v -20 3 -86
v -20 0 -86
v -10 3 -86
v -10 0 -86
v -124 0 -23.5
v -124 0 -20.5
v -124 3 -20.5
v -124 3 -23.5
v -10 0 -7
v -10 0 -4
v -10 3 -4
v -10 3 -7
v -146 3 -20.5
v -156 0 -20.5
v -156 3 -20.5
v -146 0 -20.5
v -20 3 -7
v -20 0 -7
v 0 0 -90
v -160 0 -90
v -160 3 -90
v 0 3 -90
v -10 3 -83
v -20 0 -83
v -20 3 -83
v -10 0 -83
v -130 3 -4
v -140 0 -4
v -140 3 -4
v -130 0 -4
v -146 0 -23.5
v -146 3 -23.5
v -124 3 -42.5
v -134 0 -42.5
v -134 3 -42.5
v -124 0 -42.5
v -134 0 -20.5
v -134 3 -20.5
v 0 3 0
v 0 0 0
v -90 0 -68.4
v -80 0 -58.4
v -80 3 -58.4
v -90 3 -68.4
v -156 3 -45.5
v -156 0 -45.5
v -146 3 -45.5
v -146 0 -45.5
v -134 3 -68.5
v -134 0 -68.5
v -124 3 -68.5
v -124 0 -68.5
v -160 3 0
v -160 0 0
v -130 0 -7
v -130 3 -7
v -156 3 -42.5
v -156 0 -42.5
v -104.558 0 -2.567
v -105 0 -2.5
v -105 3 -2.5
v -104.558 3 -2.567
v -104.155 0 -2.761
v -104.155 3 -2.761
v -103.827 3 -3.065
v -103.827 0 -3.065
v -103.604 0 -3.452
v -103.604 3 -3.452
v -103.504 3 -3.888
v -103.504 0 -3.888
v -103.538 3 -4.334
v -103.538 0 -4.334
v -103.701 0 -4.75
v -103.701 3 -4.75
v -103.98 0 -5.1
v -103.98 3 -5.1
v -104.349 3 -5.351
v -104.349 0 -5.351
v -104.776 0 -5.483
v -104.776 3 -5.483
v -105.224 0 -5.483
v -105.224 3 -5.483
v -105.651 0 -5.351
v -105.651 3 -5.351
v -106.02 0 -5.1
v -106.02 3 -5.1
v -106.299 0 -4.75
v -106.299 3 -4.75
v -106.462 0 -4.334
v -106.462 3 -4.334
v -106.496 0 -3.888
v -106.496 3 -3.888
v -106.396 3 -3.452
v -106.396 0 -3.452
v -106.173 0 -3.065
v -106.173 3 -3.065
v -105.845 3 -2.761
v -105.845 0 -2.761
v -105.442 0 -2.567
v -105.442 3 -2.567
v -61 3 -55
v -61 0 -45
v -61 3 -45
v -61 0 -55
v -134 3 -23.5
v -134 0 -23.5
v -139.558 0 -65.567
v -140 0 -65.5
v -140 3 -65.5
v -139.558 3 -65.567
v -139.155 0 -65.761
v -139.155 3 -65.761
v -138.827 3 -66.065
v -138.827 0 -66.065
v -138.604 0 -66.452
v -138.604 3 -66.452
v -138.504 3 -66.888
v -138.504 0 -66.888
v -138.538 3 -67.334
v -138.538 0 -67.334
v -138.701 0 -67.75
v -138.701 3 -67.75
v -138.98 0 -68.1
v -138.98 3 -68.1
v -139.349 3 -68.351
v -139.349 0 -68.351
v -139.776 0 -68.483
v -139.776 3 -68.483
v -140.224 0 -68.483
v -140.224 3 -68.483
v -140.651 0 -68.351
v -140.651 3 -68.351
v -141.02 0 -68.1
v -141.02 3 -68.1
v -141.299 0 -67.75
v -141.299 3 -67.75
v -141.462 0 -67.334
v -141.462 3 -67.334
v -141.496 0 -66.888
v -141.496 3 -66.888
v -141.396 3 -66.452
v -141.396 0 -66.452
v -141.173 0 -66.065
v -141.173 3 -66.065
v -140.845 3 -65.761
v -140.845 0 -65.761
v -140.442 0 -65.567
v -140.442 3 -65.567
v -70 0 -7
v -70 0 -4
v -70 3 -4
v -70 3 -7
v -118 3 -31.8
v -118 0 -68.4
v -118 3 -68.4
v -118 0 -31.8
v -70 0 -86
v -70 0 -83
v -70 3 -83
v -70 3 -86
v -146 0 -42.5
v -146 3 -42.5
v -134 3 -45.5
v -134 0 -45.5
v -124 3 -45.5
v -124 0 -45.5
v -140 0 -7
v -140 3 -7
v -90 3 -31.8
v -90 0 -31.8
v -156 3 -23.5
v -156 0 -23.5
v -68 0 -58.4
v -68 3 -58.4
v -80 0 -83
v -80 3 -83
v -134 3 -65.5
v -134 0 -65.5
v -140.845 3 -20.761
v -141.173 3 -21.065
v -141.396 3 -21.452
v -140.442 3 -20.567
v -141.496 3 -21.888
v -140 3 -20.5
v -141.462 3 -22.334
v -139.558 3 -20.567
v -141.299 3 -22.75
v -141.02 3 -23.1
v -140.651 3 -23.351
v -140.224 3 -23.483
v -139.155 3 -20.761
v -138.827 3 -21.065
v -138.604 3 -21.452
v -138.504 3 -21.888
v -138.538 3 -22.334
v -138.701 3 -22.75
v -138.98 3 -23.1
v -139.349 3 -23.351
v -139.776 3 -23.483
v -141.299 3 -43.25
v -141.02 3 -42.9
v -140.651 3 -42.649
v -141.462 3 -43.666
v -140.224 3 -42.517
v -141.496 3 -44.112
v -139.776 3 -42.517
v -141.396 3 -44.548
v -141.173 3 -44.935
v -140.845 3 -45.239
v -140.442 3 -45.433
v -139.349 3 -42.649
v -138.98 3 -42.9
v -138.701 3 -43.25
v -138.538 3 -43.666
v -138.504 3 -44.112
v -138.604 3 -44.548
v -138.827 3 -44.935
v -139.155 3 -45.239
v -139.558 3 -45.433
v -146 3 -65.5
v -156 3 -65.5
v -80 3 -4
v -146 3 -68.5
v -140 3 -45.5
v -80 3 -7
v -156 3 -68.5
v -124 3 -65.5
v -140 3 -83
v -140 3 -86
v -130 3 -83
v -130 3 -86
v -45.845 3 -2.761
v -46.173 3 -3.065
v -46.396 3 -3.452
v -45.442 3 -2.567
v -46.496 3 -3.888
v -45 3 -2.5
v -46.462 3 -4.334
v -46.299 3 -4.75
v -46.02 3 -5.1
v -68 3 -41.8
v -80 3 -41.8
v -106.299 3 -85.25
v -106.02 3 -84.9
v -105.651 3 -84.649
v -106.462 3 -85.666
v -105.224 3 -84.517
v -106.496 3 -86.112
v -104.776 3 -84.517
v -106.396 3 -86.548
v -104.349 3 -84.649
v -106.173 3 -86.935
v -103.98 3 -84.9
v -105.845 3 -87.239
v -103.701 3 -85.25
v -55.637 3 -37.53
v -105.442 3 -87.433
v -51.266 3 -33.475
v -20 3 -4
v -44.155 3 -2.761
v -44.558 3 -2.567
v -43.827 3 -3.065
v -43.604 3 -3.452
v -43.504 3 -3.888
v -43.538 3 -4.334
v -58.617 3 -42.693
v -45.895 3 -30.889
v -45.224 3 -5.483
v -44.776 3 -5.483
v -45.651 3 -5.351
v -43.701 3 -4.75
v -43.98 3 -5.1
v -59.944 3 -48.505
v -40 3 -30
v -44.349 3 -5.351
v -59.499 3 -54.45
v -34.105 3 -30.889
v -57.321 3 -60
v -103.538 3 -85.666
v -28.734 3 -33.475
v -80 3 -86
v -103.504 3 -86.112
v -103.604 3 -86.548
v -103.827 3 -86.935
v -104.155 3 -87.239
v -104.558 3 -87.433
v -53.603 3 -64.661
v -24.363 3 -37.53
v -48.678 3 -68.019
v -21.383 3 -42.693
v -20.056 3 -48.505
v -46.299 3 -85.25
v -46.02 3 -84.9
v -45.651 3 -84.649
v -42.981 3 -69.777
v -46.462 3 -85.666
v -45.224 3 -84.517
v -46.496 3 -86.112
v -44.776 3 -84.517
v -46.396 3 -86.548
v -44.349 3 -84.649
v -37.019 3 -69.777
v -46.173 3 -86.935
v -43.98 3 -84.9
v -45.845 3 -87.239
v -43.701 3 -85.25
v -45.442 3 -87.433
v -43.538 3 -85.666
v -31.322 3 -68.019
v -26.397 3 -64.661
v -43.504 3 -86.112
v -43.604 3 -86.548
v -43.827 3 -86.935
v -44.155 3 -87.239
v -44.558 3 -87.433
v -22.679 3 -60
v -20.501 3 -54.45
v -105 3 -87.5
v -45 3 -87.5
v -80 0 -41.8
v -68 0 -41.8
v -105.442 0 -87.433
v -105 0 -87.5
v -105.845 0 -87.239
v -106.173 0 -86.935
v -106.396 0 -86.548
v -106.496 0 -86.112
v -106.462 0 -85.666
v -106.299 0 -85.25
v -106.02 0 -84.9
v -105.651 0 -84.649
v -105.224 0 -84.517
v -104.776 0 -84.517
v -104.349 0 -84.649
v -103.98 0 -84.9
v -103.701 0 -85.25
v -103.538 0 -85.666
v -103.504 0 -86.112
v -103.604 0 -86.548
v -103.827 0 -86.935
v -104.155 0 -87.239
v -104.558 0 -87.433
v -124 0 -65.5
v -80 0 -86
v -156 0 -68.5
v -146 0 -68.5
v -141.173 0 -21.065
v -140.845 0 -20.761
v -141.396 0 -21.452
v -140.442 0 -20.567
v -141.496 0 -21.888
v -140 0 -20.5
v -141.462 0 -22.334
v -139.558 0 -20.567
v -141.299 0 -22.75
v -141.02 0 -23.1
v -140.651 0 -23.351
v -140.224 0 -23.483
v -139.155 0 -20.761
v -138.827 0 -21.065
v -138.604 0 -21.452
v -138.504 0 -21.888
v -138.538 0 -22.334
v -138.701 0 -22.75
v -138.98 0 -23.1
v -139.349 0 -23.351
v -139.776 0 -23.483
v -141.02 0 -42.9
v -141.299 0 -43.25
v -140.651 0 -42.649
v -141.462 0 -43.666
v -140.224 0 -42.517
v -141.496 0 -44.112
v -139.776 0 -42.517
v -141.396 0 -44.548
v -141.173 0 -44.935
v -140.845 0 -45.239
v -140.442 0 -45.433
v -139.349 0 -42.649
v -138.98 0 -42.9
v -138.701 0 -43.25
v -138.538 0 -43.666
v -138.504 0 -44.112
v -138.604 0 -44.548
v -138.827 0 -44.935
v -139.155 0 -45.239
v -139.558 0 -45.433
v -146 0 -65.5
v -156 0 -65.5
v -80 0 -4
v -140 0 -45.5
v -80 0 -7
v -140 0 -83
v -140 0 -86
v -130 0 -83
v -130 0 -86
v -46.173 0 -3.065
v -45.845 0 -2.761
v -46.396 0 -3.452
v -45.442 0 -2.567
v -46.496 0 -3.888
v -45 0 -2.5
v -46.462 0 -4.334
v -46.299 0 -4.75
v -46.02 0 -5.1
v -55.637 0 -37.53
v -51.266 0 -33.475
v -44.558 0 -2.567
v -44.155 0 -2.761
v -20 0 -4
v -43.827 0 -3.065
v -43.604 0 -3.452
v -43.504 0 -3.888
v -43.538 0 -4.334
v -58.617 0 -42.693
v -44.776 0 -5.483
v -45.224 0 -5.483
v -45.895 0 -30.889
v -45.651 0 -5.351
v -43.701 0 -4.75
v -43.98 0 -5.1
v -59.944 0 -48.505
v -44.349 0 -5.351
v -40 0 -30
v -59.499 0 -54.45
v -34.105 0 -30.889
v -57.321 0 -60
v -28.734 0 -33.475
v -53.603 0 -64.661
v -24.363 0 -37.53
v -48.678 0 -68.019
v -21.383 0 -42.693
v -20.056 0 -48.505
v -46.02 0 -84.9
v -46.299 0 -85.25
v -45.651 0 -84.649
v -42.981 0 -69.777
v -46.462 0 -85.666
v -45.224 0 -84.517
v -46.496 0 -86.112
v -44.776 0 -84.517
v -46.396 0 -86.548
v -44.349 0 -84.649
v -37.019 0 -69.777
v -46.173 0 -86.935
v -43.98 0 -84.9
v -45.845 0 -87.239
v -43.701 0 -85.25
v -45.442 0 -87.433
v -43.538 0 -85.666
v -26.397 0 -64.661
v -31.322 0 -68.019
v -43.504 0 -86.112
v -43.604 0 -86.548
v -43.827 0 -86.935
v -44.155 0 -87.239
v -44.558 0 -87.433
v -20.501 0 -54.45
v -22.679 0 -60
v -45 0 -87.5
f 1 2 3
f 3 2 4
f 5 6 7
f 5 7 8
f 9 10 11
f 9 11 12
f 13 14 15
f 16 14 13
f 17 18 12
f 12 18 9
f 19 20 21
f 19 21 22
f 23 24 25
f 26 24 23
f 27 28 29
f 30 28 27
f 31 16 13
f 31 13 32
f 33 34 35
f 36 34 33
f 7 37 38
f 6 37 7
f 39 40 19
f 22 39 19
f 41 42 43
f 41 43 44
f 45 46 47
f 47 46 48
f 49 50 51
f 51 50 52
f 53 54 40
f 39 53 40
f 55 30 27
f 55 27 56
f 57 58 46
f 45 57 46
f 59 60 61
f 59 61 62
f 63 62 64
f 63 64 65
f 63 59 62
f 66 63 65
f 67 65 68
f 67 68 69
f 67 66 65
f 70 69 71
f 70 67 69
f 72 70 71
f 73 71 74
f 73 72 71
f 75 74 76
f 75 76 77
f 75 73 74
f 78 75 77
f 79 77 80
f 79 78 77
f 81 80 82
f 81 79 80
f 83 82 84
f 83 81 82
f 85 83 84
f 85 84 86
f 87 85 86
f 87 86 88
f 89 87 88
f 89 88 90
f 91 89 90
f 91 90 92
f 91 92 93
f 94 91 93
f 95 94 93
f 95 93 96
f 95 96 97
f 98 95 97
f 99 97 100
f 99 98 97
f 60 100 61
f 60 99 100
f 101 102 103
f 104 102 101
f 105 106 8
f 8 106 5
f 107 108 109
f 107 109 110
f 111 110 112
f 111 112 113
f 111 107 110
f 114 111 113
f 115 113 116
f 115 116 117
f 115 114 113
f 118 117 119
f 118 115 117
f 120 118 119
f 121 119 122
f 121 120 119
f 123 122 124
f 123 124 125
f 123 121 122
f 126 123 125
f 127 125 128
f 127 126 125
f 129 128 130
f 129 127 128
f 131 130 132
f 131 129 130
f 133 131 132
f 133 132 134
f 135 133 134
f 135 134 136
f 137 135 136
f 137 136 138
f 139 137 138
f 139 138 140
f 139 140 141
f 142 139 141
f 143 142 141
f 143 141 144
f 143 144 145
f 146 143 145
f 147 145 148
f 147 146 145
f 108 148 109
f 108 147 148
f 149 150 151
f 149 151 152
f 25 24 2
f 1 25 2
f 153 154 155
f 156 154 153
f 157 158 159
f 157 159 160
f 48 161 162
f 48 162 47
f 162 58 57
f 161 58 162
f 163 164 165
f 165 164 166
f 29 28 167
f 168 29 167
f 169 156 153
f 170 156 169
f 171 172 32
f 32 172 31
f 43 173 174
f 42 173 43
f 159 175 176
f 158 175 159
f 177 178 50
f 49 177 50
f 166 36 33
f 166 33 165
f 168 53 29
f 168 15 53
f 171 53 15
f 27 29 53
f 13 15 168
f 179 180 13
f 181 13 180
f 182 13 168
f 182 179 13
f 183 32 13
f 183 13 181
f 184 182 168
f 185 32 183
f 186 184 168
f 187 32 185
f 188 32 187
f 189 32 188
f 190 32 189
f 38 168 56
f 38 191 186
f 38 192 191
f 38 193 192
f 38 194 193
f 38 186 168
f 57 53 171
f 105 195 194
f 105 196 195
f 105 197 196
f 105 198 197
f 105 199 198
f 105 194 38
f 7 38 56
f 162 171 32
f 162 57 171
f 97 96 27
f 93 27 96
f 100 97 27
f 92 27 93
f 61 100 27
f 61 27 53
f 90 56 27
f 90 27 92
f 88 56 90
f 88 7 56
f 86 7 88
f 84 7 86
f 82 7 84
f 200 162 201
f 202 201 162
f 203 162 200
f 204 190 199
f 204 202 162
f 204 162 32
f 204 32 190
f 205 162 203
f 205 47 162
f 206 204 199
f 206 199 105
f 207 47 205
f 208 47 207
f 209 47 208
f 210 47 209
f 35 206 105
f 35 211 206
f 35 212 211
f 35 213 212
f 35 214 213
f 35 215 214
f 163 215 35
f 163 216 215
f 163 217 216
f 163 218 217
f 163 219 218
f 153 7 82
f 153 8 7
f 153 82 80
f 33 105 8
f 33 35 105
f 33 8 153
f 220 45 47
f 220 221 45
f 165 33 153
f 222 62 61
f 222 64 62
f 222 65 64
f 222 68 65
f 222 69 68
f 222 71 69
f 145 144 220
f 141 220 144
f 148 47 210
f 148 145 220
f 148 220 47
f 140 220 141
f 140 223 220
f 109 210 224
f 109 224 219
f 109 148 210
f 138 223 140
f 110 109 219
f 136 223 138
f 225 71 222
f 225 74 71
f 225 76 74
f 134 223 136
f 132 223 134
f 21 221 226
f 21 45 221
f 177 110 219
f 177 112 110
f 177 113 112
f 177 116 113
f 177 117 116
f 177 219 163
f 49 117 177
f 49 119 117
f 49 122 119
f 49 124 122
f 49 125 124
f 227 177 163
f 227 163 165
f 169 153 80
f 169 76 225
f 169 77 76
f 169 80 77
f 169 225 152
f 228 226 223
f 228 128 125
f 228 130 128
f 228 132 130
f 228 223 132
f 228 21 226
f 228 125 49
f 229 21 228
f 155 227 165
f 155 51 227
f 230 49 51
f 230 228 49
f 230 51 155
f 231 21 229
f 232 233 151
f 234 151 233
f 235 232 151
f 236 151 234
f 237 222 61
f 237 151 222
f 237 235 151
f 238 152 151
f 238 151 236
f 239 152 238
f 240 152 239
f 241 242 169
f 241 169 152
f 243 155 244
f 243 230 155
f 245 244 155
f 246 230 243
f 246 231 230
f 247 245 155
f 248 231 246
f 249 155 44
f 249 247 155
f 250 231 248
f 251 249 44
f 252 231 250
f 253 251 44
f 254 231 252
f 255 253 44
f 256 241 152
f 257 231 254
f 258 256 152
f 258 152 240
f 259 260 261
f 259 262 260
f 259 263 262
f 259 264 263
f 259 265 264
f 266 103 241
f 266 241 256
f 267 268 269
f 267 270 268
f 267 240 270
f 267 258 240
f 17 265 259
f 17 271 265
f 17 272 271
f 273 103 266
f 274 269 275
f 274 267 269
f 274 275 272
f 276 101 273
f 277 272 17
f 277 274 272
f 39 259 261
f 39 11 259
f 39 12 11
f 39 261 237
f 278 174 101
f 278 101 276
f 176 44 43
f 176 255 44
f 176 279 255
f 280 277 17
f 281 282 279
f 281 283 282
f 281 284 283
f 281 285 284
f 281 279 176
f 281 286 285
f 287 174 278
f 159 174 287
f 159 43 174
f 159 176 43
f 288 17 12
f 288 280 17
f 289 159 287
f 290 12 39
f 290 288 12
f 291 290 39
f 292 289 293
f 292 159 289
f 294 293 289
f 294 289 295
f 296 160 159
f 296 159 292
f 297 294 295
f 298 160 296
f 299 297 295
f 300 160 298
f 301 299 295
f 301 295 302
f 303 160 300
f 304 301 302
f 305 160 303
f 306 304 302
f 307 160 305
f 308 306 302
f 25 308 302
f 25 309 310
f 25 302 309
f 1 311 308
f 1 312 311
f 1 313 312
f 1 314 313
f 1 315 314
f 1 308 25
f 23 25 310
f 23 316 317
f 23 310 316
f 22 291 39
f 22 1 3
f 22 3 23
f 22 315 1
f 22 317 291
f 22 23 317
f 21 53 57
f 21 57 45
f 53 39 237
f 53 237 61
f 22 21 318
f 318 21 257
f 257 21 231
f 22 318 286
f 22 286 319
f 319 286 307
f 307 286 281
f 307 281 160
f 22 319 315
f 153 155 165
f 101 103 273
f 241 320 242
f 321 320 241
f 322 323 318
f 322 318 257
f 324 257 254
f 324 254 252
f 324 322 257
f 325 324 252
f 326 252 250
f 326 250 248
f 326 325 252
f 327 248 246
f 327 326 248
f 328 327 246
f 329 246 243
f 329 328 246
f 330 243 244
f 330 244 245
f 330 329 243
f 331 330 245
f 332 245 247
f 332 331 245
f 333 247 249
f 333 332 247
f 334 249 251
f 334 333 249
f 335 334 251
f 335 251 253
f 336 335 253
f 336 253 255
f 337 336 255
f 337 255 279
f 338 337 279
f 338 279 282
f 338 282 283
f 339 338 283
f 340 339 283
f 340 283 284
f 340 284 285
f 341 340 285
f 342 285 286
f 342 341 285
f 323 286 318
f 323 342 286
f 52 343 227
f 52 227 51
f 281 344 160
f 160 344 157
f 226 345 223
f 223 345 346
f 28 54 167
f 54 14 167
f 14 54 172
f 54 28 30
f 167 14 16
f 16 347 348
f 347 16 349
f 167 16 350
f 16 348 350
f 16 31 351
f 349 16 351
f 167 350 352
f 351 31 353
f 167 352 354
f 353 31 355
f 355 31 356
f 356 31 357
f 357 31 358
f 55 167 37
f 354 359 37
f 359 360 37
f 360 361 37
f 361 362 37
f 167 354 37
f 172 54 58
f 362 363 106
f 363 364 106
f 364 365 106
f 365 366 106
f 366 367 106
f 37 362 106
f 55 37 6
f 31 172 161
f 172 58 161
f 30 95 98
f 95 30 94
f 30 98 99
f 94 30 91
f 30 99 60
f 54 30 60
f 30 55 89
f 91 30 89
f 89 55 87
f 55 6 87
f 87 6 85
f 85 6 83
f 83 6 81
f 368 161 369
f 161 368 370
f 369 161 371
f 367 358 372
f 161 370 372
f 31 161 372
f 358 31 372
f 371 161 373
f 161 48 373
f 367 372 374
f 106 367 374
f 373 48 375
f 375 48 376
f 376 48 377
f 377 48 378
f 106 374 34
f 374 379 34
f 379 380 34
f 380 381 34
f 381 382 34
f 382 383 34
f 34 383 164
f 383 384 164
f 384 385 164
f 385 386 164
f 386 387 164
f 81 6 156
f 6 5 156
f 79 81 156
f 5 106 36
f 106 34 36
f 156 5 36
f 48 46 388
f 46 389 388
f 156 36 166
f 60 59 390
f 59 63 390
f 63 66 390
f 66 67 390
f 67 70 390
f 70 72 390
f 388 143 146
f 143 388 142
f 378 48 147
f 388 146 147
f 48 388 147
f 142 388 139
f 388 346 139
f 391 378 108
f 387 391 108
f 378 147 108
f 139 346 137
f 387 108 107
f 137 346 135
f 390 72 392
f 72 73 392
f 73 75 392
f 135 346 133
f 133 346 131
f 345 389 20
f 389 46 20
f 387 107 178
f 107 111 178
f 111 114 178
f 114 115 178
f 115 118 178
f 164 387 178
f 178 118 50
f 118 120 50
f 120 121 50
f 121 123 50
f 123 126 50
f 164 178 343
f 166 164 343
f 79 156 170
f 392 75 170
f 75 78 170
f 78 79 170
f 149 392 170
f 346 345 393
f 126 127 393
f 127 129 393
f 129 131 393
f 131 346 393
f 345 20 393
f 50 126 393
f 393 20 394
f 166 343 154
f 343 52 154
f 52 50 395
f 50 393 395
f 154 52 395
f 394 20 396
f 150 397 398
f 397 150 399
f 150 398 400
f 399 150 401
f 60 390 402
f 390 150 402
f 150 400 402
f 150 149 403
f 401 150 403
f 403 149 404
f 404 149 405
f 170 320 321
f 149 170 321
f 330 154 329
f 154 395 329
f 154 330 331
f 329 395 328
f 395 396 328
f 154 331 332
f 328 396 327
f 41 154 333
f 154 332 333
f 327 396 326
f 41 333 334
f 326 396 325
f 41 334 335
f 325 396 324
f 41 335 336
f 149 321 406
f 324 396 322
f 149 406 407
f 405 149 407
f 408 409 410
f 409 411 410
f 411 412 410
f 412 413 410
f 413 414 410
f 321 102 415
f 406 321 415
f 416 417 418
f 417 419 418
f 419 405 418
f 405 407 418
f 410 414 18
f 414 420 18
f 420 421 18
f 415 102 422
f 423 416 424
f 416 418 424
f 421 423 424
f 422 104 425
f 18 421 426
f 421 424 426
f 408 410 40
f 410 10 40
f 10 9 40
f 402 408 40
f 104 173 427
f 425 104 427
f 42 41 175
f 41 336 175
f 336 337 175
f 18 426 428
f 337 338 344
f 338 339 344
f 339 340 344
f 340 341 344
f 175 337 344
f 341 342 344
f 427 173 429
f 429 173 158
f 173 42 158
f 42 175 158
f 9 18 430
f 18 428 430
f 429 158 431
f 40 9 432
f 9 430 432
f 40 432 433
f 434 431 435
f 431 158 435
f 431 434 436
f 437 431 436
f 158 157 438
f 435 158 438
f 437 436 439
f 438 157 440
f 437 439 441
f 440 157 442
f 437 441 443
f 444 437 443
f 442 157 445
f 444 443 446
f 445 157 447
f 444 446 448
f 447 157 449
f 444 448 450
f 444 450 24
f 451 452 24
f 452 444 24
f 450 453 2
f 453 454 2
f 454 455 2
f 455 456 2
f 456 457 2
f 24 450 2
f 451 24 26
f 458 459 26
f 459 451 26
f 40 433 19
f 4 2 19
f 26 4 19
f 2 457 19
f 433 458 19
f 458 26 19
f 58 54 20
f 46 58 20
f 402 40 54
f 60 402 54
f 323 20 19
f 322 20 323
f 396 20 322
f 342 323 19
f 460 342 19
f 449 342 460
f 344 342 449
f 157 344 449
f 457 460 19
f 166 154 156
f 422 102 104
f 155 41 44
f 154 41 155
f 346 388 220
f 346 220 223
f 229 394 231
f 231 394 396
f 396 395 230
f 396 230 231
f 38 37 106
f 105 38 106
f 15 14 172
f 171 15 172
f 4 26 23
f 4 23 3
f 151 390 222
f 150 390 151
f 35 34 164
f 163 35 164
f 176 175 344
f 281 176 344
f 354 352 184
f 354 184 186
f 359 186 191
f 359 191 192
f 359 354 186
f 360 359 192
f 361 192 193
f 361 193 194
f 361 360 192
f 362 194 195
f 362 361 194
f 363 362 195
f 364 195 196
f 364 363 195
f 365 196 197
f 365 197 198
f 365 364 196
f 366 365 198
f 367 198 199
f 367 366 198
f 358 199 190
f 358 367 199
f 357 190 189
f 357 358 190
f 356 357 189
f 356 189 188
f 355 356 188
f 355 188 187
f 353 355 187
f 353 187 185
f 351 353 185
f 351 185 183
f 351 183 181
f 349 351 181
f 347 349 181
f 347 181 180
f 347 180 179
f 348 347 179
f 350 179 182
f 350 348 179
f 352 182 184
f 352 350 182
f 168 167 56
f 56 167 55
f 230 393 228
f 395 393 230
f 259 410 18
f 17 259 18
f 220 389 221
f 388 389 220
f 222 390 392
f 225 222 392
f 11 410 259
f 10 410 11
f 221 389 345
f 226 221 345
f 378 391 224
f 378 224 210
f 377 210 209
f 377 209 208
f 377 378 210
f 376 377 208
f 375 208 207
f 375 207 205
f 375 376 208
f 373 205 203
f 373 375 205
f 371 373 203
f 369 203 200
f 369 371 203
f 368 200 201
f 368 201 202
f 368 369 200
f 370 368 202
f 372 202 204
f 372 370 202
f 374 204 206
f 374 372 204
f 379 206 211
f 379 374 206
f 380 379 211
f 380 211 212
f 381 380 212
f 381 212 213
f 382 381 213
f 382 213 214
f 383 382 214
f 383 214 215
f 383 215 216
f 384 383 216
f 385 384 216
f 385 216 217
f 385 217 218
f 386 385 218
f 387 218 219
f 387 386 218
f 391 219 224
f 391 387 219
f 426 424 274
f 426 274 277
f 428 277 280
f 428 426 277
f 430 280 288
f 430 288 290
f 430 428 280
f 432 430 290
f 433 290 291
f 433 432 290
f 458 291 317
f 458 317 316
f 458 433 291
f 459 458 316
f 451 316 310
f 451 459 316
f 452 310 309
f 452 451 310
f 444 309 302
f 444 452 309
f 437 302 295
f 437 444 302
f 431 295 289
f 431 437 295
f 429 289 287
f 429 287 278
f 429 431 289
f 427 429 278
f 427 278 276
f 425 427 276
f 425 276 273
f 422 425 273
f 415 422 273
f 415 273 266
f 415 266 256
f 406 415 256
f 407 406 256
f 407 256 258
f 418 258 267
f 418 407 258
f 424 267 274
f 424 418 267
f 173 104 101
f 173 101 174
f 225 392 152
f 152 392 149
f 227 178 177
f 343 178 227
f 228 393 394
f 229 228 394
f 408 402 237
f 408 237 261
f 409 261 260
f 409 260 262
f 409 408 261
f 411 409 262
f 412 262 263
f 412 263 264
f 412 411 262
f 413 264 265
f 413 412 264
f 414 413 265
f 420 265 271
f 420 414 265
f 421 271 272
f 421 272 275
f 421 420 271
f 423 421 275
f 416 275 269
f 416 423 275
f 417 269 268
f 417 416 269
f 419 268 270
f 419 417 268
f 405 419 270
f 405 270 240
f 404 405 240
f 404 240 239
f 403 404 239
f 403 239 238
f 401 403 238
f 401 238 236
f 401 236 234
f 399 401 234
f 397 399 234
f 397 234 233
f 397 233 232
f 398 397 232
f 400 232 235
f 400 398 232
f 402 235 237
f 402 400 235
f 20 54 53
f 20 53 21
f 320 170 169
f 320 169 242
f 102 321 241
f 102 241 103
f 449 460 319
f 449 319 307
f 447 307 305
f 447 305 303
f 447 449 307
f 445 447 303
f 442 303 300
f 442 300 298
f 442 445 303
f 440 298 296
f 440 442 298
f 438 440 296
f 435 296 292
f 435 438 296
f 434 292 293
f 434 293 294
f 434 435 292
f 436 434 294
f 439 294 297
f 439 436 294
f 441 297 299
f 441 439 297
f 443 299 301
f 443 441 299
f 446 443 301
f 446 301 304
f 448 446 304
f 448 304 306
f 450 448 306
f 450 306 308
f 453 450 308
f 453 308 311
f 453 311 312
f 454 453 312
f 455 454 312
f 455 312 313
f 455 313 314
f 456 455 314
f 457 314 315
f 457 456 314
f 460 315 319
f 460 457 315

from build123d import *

# Parameters (mm, degrees)
SKETCH1_W           = 160
SKETCH1_H           = 90
SKETCH1_R           = 20
SKETCH1_R_2         = 1.5
SKETCH1_W_2         = 10
SKETCH1_H_2         = 3
BOSS_EXTRUDE1_DEPTH = 3


with BuildPart() as part:
    # Sketch1 → Boss-Extrude1 (new body)
    with BuildSketch(Plane(origin=(0, 0, 0), x_dir=(1, 0, 0), z_dir=(0, 1, 0))):
        with Locations((-80, 45)):
            Rectangle(SKETCH1_W, SKETCH1_H)
        with Locations(Location((-40, 50, 0), (0, 0, 270))):
            Circle(SKETCH1_R, mode=Mode.SUBTRACT)
        with Locations(Location((-105, 4, 0), (0, 0, 270))):
            Circle(SKETCH1_R_2, mode=Mode.SUBTRACT)
        with Locations(Location((-45, 4, 0), (0, 0, 270))):
            Circle(SKETCH1_R_2, mode=Mode.SUBTRACT)
        with Locations(Location((-105, 86, 0), (0, 0, 90))):
            Circle(SKETCH1_R_2, mode=Mode.SUBTRACT)
        with Locations(Location((-45, 86, 0), (0, 0, 90))):
            Circle(SKETCH1_R_2, mode=Mode.SUBTRACT)
        with Locations(Location((-140, 67, 0), (0, 0, 270))):
            Circle(SKETCH1_R_2, mode=Mode.SUBTRACT)
        with Locations(Location((-140, 44, 0), (0, 0, 90))):
            Circle(SKETCH1_R_2, mode=Mode.SUBTRACT)
        with Locations(Location((-140, 22, 0), (0, 0, 270))):
            Circle(SKETCH1_R_2, mode=Mode.SUBTRACT)
        Polygon((-118, 68.4), (-118, 31.8), (-90, 31.8), (-80, 41.8), (-68, 41.8), (-61, 45), (-61, 55), (-68, 58.4), (-80, 58.4), (-90, 68.4), align=None, mode=Mode.SUBTRACT)
        with Locations((-135, 84.5)):
            Rectangle(SKETCH1_W_2, SKETCH1_H_2, mode=Mode.SUBTRACT)
        with Locations((-135, 5.5)):
            Rectangle(SKETCH1_W_2, SKETCH1_H_2, mode=Mode.SUBTRACT)
        with Locations((-75, 5.5)):
            Rectangle(SKETCH1_W_2, SKETCH1_H_2, mode=Mode.SUBTRACT)
        with Locations((-75, 84.5)):
            Rectangle(SKETCH1_W_2, SKETCH1_H_2, mode=Mode.SUBTRACT)
        with Locations((-15, 5.5)):
            Rectangle(SKETCH1_W_2, SKETCH1_H_2, mode=Mode.SUBTRACT)
        with Locations((-15, 84.5)):
            Rectangle(SKETCH1_W_2, SKETCH1_H_2, mode=Mode.SUBTRACT)
        with Locations((-151, 67)):
            Rectangle(SKETCH1_W_2, SKETCH1_H_2, mode=Mode.SUBTRACT)
        with Locations((-129, 67)):
            Rectangle(SKETCH1_W_2, SKETCH1_H_2, mode=Mode.SUBTRACT)
        with Locations((-129, 44)):
            Rectangle(SKETCH1_W_2, SKETCH1_H_2, mode=Mode.SUBTRACT)
        with Locations((-151, 44)):
            Rectangle(SKETCH1_W_2, SKETCH1_H_2, mode=Mode.SUBTRACT)
        with Locations((-151, 22)):
            Rectangle(SKETCH1_W_2, SKETCH1_H_2, mode=Mode.SUBTRACT)
        with Locations((-129, 22)):
            Rectangle(SKETCH1_W_2, SKETCH1_H_2, mode=Mode.SUBTRACT)
    extrude(amount=BOSS_EXTRUDE1_DEPTH)


solid = part.part
